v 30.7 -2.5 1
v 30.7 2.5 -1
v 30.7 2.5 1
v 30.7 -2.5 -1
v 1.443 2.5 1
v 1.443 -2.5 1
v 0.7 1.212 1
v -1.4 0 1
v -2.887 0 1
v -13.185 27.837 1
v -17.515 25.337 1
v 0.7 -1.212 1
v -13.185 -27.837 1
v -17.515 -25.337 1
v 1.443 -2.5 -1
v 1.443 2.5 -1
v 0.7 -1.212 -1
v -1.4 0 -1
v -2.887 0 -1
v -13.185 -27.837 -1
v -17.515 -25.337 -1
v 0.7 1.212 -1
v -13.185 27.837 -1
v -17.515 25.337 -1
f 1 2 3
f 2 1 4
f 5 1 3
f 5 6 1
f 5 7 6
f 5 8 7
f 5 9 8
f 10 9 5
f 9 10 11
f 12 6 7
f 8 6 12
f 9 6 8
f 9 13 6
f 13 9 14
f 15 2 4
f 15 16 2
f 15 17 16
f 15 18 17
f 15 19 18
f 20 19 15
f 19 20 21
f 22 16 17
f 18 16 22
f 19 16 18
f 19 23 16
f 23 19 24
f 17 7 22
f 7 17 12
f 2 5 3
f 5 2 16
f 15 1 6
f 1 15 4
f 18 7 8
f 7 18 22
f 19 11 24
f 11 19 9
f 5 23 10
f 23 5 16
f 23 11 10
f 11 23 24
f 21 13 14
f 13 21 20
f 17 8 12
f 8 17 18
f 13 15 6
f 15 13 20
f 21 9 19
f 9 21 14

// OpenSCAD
for(i=[0:3]){
rotate([0,0,360/3*i])
translate([15.7,0,0])
cube([30, 5, 2], true);
}
